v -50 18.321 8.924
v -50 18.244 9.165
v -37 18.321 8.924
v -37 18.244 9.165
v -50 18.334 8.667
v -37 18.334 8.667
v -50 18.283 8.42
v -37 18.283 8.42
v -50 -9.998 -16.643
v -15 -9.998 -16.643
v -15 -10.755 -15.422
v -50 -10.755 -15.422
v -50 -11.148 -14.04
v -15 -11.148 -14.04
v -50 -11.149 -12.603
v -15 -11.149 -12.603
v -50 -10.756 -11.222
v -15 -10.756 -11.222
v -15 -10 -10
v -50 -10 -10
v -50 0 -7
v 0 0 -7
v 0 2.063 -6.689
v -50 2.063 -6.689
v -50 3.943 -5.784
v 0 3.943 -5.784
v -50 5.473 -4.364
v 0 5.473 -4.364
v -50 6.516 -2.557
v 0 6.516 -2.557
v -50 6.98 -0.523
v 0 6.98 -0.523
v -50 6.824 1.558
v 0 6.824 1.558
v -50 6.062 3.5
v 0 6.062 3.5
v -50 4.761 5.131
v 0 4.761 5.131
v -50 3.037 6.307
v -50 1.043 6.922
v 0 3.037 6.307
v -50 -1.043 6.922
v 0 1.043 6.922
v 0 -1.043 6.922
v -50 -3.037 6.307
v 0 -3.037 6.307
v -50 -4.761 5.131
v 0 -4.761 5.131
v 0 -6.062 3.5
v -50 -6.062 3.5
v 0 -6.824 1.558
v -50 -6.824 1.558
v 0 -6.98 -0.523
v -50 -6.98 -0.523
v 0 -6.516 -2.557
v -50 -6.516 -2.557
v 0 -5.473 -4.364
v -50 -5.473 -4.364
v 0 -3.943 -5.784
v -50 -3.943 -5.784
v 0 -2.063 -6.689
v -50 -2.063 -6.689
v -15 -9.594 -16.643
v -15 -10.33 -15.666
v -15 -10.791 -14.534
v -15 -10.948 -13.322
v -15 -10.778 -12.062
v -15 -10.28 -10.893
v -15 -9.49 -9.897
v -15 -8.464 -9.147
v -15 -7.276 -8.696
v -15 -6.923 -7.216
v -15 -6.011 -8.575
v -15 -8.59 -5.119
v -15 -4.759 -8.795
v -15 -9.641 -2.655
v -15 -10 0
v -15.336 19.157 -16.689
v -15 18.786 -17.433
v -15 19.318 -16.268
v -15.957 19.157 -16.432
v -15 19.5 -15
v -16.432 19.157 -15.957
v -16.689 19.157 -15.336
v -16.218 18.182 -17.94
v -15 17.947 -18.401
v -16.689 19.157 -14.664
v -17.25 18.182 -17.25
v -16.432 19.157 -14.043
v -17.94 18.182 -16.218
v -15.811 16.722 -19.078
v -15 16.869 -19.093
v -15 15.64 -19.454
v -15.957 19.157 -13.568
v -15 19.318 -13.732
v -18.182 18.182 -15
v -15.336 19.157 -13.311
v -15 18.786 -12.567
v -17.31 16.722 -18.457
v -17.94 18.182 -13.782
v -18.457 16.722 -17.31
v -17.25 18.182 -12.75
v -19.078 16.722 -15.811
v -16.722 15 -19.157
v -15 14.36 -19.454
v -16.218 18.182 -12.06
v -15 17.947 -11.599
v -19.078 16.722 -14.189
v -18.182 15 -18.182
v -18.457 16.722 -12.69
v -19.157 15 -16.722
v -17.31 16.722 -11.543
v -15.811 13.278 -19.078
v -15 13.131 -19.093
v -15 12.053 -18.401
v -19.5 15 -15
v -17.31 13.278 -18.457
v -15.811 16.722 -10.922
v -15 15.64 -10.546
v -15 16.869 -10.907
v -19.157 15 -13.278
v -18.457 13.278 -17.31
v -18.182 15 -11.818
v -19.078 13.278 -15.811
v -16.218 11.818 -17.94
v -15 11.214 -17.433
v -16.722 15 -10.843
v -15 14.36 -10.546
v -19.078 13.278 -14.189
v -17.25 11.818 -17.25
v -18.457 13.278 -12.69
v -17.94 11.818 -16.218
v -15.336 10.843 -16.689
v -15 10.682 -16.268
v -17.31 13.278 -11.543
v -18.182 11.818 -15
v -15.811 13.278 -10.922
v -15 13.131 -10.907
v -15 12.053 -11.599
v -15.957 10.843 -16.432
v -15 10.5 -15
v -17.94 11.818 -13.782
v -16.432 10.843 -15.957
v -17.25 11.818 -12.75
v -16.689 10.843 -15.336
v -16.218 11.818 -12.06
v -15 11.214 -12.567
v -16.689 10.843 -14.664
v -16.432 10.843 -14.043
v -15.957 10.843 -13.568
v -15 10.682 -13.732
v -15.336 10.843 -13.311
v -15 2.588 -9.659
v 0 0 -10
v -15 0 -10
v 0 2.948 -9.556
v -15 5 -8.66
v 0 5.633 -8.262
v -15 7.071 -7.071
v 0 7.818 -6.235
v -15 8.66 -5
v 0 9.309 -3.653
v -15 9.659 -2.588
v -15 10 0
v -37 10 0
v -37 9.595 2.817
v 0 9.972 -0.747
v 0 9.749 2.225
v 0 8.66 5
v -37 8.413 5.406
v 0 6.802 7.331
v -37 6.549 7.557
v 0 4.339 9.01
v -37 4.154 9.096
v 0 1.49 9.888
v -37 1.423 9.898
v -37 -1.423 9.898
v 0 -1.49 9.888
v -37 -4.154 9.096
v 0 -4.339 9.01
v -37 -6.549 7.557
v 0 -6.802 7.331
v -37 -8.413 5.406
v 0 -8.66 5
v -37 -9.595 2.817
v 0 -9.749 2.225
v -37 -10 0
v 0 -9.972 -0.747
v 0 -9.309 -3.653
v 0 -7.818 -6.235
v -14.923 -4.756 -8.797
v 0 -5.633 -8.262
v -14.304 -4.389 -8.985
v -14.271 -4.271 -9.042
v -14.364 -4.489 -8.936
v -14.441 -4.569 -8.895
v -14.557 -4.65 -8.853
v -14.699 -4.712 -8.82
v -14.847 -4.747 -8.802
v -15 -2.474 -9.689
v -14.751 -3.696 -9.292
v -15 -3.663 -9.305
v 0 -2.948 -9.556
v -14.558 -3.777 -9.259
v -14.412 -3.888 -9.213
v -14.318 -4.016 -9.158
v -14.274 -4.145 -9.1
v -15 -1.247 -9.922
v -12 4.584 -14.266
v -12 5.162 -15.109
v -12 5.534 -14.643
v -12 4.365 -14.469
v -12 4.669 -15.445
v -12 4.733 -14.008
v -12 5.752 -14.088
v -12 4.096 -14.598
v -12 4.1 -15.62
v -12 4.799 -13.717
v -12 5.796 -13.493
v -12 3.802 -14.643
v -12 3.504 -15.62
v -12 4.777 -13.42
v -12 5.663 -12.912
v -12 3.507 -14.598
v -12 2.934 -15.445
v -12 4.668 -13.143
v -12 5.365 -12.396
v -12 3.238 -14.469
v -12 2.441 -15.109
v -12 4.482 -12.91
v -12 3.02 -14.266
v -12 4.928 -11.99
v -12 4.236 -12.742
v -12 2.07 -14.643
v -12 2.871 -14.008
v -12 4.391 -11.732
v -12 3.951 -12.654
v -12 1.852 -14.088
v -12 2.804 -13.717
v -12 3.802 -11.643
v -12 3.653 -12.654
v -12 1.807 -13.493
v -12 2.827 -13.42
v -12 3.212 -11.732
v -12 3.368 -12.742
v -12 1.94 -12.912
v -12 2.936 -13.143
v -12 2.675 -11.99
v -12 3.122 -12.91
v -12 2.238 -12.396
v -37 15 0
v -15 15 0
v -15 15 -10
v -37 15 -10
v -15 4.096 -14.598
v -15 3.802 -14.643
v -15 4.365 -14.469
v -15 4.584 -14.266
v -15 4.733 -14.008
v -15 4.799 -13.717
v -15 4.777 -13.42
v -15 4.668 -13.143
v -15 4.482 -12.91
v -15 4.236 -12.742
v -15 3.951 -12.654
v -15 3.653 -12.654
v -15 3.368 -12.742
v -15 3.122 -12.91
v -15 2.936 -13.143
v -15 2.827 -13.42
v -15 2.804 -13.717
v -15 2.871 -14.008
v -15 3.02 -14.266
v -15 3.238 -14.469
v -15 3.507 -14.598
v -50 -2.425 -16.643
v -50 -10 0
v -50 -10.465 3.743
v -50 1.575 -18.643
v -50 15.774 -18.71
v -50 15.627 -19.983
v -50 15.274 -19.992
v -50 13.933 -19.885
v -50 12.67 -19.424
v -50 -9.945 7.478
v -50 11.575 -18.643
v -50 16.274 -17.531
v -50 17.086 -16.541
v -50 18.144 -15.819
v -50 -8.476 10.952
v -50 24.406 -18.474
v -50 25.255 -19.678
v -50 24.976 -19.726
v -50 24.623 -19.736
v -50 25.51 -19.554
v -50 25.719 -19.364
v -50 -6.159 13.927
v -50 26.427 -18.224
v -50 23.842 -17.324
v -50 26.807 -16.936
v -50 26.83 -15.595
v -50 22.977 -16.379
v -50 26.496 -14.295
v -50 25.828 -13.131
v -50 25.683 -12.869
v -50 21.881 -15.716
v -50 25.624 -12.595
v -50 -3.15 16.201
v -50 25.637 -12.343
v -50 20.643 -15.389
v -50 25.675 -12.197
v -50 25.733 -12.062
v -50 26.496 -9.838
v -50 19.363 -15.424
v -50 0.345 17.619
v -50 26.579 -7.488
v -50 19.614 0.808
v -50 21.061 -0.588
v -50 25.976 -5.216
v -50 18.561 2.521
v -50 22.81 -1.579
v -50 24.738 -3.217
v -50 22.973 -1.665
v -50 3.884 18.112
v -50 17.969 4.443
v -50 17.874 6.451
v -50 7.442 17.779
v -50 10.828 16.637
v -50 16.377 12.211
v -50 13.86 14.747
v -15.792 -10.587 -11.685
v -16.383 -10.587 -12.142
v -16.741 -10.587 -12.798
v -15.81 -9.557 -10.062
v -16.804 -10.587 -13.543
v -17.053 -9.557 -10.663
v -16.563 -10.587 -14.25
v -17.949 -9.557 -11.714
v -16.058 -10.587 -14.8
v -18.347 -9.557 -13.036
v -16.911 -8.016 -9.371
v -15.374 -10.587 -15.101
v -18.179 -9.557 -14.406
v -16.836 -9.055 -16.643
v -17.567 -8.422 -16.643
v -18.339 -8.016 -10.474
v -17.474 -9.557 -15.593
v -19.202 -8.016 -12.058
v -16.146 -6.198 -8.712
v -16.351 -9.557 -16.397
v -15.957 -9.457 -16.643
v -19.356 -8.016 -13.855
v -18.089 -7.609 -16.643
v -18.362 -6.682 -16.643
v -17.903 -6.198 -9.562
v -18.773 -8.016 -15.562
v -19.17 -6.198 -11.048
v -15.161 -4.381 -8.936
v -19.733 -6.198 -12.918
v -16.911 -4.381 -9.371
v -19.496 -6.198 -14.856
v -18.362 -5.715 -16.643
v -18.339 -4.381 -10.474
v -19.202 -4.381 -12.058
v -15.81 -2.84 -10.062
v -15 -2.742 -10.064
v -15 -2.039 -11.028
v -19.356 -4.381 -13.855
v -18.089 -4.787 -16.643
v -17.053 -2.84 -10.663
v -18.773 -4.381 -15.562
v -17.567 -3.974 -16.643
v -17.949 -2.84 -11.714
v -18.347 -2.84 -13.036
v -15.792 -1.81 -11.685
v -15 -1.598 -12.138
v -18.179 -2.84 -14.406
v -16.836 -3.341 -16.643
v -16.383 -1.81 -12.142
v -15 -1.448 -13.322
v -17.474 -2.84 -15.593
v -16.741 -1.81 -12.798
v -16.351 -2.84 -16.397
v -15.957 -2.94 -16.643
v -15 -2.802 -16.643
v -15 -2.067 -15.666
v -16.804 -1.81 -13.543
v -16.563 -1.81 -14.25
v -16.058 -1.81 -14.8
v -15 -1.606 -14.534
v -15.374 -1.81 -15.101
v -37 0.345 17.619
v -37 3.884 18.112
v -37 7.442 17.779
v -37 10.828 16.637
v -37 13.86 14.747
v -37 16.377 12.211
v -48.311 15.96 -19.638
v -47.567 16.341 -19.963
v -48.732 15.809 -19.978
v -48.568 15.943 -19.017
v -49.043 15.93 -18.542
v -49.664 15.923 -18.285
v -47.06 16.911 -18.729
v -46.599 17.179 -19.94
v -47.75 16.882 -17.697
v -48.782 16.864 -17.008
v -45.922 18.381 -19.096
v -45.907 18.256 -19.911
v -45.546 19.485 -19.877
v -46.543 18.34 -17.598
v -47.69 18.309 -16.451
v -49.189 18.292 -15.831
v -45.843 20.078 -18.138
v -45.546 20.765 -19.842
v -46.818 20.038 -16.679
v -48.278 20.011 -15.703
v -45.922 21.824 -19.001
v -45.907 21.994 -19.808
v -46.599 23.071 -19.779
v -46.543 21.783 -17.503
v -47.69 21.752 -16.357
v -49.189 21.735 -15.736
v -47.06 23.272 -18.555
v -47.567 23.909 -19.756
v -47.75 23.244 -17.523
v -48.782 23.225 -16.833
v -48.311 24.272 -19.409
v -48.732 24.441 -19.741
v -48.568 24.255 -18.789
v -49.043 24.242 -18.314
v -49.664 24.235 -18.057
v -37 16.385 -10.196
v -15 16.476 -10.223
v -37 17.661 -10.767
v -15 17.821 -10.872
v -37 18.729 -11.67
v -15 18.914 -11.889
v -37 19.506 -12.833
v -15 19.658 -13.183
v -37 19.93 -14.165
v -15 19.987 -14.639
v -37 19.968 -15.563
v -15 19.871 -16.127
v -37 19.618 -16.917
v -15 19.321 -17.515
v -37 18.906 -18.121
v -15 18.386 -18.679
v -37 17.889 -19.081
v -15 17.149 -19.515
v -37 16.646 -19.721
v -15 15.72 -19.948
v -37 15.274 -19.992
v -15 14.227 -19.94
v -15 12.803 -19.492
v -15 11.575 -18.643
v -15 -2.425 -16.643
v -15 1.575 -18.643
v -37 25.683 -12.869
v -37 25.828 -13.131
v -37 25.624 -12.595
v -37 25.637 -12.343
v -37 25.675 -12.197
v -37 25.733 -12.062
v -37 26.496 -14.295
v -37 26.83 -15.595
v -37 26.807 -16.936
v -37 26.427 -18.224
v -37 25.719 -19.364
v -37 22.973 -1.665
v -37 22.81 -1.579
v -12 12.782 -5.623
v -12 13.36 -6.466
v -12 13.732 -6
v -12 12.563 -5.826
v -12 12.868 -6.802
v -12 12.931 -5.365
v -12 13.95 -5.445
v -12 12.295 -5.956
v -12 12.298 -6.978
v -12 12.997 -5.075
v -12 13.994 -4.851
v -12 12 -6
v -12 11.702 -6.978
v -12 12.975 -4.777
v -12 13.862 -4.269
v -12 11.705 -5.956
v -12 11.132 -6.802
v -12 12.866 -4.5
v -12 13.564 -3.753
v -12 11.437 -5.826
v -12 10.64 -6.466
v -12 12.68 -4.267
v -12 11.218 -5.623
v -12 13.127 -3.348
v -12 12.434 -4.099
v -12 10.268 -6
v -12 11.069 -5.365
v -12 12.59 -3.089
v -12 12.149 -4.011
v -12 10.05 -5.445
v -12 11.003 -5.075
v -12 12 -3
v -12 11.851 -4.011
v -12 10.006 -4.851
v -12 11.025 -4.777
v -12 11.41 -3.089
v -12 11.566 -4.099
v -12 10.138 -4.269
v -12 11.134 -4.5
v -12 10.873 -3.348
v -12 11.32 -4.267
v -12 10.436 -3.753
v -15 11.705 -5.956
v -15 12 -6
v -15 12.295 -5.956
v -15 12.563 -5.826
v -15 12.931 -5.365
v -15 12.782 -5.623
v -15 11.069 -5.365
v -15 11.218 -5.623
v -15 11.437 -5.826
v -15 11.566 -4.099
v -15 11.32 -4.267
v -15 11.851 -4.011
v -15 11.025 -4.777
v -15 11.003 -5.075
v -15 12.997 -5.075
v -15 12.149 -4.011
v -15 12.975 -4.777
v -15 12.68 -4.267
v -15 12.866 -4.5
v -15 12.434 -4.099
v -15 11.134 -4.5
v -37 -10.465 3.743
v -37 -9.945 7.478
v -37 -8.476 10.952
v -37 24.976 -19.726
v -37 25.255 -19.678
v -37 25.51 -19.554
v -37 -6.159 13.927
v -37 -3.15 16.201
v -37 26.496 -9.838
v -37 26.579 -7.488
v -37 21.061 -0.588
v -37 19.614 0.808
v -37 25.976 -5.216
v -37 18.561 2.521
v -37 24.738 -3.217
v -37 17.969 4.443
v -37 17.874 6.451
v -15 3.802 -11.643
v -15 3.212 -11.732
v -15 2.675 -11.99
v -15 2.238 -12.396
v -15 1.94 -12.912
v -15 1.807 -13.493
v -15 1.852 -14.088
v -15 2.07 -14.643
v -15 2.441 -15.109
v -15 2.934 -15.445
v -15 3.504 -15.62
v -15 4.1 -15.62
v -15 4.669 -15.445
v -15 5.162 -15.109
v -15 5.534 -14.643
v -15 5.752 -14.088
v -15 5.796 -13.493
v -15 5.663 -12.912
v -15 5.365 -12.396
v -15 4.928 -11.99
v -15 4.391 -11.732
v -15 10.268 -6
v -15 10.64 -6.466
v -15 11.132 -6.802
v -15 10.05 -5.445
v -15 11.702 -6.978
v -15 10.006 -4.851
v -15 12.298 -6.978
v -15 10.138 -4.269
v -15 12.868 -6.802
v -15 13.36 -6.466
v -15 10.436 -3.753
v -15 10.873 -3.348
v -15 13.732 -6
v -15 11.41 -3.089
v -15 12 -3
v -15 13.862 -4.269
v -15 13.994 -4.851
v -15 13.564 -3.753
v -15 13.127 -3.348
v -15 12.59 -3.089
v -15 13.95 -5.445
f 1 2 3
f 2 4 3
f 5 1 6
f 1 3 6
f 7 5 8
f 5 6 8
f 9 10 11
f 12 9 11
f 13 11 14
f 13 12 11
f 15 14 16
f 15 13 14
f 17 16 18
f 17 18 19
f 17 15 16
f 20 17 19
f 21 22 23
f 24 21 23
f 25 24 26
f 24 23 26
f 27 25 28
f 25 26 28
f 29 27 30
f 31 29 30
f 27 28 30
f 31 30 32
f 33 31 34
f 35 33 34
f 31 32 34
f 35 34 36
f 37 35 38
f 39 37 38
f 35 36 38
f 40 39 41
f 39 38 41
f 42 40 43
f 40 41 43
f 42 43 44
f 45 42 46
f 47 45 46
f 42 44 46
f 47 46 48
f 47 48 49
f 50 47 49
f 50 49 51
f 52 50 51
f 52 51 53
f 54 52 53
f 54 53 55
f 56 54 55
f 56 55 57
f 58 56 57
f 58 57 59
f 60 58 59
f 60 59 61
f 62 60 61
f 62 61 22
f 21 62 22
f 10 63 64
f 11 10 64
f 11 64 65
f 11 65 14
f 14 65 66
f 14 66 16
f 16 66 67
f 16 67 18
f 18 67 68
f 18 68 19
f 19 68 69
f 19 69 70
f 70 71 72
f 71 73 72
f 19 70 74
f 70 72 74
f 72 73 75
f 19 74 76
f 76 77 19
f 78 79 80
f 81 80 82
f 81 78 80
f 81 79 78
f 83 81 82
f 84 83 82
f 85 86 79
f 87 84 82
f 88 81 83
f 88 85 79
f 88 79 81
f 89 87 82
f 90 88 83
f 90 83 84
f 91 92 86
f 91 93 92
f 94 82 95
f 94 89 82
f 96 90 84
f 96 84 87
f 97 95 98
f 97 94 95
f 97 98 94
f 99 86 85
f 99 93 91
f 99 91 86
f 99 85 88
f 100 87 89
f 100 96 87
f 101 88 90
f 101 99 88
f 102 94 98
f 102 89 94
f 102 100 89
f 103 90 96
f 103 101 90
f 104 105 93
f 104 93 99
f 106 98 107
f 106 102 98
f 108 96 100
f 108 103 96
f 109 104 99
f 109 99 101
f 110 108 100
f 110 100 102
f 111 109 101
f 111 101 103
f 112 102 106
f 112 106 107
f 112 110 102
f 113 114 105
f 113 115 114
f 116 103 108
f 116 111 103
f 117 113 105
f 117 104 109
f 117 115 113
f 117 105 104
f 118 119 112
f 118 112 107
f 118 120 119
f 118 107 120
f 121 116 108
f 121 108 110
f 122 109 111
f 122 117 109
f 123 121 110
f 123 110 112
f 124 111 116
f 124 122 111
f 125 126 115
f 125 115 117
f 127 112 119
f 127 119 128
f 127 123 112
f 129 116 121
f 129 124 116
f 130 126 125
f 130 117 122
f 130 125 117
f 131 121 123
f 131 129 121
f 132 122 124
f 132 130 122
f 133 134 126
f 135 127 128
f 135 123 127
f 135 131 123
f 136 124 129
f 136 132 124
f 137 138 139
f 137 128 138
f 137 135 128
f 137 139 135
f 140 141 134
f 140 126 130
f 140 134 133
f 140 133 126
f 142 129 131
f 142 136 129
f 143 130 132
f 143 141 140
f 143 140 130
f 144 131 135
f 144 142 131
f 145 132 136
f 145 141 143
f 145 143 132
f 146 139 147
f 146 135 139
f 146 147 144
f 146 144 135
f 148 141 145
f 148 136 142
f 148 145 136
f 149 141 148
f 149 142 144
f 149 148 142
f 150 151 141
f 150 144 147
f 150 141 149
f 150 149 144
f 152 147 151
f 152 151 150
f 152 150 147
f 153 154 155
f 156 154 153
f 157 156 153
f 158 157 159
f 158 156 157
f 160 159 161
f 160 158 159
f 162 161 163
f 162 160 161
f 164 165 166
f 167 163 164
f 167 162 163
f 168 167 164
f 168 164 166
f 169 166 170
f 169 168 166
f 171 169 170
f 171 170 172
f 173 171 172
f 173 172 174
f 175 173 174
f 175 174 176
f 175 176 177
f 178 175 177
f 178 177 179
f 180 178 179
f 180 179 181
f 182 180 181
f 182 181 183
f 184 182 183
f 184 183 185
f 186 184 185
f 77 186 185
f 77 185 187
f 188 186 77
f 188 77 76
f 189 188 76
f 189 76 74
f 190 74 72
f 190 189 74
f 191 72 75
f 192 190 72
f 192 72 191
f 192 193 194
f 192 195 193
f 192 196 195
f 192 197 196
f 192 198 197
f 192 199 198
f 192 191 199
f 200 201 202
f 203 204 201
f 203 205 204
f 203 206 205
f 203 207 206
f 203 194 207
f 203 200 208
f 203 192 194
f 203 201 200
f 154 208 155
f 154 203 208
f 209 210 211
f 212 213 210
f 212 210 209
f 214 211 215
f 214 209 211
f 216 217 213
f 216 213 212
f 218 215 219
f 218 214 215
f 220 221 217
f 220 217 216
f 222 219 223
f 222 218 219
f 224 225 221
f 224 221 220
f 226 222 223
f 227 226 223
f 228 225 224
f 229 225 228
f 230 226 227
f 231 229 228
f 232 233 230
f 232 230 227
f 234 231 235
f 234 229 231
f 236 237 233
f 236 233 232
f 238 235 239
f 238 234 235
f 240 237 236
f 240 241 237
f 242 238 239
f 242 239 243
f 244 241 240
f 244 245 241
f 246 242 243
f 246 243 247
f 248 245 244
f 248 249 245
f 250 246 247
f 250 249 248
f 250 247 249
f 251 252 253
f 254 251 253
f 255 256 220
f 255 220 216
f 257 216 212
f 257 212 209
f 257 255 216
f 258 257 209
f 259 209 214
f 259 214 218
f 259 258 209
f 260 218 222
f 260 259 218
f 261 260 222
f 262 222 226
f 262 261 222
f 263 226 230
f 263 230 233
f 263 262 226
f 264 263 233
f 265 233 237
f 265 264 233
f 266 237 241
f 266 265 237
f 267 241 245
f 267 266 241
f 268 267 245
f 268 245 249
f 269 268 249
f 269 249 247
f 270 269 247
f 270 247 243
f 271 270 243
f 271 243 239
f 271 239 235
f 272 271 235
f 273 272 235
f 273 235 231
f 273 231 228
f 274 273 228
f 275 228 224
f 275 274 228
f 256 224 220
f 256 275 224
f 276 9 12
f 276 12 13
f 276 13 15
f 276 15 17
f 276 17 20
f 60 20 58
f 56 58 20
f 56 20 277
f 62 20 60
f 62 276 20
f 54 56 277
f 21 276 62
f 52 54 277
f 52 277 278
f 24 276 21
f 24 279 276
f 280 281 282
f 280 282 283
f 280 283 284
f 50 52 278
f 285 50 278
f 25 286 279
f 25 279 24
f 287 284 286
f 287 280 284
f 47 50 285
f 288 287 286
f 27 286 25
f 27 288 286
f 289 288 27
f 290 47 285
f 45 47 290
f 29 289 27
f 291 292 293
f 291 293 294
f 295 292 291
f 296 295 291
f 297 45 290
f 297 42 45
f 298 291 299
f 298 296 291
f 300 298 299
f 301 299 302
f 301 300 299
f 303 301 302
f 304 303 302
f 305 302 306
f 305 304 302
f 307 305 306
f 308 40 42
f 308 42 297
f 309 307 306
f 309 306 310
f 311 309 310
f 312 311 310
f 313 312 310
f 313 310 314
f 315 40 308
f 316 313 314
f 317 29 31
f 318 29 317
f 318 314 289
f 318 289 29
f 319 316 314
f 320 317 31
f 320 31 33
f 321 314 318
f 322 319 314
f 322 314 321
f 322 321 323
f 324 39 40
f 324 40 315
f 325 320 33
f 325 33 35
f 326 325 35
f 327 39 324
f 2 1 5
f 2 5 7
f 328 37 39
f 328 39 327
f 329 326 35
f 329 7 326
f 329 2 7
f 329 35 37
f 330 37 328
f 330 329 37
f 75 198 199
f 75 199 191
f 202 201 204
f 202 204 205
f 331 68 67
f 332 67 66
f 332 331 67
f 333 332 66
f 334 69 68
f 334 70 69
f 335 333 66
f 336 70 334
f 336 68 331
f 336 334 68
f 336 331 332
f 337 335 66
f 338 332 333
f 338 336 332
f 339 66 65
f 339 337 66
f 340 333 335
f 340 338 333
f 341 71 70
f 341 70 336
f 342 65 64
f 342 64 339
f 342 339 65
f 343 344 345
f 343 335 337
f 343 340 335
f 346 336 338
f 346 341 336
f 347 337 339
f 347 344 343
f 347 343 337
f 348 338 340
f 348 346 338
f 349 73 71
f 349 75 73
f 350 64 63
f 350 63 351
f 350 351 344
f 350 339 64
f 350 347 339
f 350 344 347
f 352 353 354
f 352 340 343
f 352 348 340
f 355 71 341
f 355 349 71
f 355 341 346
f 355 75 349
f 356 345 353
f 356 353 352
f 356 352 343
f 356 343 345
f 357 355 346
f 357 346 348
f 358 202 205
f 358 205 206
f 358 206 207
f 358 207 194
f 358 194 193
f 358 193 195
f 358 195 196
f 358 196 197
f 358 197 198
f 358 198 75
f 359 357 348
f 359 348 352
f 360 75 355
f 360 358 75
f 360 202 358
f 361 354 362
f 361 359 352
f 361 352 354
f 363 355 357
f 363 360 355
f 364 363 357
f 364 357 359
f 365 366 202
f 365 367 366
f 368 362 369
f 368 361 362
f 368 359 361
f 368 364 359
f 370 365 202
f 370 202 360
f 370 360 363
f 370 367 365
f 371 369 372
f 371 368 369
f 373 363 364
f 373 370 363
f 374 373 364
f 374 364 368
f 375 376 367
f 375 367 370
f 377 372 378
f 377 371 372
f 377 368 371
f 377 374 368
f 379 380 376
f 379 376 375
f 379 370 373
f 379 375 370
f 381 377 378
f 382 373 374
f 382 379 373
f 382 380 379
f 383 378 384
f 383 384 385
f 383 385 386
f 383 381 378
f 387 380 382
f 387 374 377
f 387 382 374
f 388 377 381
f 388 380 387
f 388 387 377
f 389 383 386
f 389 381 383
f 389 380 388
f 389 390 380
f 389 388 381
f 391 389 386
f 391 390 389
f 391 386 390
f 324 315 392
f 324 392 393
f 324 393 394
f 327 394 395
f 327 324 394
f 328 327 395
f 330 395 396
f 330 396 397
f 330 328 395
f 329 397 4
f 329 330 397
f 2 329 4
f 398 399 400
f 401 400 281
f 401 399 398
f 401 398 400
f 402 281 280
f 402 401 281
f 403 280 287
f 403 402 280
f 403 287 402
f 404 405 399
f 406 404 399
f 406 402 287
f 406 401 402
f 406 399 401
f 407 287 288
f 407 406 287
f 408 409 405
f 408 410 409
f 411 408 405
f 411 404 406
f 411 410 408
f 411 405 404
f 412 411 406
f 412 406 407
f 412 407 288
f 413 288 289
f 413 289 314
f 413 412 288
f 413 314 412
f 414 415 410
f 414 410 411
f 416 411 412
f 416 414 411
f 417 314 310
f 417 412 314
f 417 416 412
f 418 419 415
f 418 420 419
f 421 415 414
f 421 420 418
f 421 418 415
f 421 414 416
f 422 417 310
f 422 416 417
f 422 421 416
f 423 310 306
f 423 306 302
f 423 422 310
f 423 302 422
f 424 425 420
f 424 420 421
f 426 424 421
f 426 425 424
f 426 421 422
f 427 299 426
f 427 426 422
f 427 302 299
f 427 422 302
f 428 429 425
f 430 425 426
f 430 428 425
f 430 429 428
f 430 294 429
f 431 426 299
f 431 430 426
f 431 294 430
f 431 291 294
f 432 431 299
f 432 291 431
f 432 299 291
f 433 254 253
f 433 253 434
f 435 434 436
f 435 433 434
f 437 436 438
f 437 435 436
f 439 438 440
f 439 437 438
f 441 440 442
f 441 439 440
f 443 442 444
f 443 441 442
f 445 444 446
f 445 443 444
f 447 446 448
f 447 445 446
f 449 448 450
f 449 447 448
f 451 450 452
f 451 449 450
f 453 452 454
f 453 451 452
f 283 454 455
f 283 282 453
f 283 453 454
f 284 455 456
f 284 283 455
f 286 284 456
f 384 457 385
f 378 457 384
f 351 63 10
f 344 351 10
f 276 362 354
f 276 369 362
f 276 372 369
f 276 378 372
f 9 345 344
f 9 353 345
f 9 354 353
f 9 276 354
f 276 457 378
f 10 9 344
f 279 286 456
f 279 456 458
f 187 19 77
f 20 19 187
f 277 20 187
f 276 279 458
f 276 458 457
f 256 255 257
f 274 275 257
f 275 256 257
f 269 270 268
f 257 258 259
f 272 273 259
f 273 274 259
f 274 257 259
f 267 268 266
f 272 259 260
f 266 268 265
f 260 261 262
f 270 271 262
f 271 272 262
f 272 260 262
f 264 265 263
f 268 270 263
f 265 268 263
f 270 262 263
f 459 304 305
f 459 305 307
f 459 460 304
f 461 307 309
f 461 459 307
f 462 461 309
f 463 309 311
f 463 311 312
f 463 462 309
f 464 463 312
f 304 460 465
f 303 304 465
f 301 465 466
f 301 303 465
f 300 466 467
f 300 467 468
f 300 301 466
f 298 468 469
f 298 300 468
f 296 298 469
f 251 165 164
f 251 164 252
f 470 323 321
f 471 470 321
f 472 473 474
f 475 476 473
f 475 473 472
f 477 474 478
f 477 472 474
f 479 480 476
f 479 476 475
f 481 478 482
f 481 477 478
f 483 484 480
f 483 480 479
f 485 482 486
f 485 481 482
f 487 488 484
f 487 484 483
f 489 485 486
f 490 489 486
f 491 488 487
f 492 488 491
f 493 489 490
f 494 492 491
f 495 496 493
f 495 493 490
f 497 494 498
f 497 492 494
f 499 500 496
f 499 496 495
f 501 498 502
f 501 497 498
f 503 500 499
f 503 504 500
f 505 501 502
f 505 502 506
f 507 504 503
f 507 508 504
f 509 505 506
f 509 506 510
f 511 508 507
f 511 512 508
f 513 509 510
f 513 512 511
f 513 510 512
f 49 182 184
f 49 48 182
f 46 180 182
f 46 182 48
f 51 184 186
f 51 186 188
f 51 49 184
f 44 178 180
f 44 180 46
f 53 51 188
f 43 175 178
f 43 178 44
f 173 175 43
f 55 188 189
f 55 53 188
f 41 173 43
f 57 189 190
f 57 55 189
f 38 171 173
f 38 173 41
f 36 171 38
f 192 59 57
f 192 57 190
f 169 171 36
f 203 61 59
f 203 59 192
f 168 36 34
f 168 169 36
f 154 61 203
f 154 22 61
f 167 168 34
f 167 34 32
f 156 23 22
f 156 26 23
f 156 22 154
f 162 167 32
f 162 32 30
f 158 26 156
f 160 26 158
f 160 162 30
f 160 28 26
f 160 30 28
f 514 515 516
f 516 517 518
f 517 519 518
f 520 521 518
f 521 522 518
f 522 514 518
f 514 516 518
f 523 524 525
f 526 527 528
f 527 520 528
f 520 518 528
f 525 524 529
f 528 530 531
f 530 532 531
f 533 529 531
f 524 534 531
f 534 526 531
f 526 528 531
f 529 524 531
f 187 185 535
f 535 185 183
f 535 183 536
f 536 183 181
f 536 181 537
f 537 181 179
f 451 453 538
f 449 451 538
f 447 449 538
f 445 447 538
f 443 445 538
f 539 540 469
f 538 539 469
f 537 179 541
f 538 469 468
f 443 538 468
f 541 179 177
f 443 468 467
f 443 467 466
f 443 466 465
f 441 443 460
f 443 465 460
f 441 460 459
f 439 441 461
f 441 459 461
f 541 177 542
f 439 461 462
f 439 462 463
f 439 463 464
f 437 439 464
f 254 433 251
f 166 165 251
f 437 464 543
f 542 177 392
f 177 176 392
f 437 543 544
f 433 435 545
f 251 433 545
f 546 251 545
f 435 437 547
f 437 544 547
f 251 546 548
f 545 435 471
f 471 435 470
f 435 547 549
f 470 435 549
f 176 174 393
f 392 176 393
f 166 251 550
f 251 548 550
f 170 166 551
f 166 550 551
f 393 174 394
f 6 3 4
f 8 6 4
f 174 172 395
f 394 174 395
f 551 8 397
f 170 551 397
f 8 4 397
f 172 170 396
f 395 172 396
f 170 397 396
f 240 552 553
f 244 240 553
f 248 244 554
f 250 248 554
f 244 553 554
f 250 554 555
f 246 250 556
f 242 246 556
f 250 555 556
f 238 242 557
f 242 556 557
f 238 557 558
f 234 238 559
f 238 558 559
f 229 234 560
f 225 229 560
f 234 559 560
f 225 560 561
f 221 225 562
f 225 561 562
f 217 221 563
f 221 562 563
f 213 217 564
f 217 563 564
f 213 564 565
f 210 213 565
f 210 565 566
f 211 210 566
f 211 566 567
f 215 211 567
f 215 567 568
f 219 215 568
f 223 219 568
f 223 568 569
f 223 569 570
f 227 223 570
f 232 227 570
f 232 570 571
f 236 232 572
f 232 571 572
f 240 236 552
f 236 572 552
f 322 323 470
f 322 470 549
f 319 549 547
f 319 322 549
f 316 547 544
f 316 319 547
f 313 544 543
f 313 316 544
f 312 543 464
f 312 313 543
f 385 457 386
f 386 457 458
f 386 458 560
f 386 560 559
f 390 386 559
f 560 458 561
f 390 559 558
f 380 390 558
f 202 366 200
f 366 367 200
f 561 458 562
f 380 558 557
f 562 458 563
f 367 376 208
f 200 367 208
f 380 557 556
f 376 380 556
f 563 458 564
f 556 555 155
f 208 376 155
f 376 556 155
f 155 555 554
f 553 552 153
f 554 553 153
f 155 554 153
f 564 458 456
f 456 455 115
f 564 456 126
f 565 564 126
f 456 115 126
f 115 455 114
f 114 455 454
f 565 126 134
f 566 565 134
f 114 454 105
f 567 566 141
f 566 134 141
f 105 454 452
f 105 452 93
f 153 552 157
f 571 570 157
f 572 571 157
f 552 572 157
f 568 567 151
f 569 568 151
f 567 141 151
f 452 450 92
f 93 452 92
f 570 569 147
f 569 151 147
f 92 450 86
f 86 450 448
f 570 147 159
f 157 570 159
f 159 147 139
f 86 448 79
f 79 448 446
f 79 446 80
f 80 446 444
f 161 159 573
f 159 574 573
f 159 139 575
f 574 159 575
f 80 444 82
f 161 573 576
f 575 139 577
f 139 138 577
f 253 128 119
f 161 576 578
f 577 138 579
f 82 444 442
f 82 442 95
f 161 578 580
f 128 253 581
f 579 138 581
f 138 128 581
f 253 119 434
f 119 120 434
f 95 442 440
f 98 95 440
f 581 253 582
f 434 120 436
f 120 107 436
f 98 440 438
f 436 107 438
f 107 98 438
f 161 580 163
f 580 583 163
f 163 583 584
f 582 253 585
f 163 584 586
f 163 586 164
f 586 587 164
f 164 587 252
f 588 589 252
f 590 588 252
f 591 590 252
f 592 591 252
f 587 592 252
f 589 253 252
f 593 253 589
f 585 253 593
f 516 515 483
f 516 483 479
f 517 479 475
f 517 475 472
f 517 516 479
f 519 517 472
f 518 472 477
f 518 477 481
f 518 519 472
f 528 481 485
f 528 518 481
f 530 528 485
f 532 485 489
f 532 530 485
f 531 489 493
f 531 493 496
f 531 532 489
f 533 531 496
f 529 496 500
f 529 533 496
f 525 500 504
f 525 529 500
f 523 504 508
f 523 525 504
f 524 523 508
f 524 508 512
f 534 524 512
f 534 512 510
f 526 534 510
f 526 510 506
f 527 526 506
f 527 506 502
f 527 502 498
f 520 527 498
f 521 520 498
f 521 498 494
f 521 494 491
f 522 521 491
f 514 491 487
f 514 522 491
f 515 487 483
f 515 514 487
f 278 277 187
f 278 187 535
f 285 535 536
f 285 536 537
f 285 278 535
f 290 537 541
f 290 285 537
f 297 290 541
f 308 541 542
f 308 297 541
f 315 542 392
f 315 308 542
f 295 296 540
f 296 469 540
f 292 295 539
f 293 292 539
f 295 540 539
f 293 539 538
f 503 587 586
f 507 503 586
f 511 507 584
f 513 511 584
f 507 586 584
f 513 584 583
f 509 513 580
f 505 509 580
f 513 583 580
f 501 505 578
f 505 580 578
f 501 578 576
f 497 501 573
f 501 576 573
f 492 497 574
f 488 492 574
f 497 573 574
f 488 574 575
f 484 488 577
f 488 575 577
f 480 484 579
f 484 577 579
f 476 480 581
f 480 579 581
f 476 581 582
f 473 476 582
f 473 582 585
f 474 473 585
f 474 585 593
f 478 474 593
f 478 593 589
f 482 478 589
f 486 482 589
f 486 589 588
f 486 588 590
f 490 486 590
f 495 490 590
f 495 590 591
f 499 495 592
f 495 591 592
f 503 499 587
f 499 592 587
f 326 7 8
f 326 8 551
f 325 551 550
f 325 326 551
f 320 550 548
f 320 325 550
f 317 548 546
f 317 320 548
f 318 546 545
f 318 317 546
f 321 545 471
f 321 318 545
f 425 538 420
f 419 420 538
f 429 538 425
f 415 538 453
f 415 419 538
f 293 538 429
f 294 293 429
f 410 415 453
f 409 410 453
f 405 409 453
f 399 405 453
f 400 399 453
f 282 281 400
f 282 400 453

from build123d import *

# Parameters (mm, degrees)
SKETCH1_R           = 10
BOSS_EXTRUDE1_DEPTH = 50
BOSS_EXTRUDE3_DEPTH = 35
SKETCH8_R           = 2
SKETCH8_R_2         = 1
BOSS_EXTRUDE4_DEPTH = 3
BOSS_EXTRUDE6_DEPTH = 13
FILLET1_R           = 1
FILLET2_R           = 1
SKETCH2_R           = 7
CUT_EXTRUDE2_DEPTH  = 61.180591


with BuildPart() as part:
    # Sketch1 → Boss-Extrude1 (new body)
    with BuildSketch(Plane(origin=(0, 0, 0), x_dir=(0, 0, -1), z_dir=(1, 0, 0))):
        Circle(SKETCH1_R)
    extrude(amount=-BOSS_EXTRUDE1_DEPTH)

    # Sketch3 → Boss-Extrude3 (add)
    with BuildSketch(Plane(origin=(-50, 0, 0), x_dir=(0, 0, -1), z_dir=(1, 0, 0))):
        with BuildLine():
            Line((0, 10), (0, 15))
            Line((0, 15), (10, 15))
            ThreePointArc((10, 15), (16.842071907, 19.648308412), (18.642708436, 11.574992664))
            Line((18.642708436, 11.574992664), (18.642708436, 1.574992664))
            Line((18.642708436, 1.574992664), (16.642708436, -2.425007336))
            Line((16.642708436, -2.425007336), (16.642708436, -9.997750449))
            ThreePointArc((16.642708436, -9.997750449), (13.321760405, -11.198307119), (10, -10))
            Line((10, -10), (0, -10))
            Line((0, -10), (0, 10))
        make_face()
    extrude(amount=BOSS_EXTRUDE3_DEPTH)

    # Sketch6 → Cut-Revolve1 (revolve, cut)
    with BuildSketch(Plane(origin=(-15, 0, 0), x_dir=(0, 0, -1), z_dir=(1, 0, 0))):
        with BuildLine():
            Line((13.321760405, -1.448307119), (13.321760405, -10.948307119))
            ThreePointArc((13.321760405, -10.948307119), (18.071760405, -6.198307119), (13.321760405, -1.448307119))
        make_face()
    revolve(axis=Axis((-15, -1.448307119, -13.321760405), (0, -1, 0)), mode=Mode.SUBTRACT)

    # Sketch7 → Cut-Revolve2 (revolve, cut)
    with BuildSketch(Plane(origin=(-15, 0, 0), x_dir=(0, 0, -1), z_dir=(1, 0, 0))):
        with BuildLine():
            Line((15, 10.5), (15, 19.5))
            ThreePointArc((15, 19.5), (19.5, 15), (15, 10.5))
        make_face()
    revolve(axis=Axis((-15, 10.5, -15), (0, 1, 0)), mode=Mode.SUBTRACT)

    # Sketch8 → Boss-Extrude4 (add)
    # profile 1 of 2: a face of its own
    with BuildSketch(Plane(origin=(-15, 0, 0), x_dir=(0, 0, -1), z_dir=(1, 0, 0))):
        with Locations(Location((13.642708436, 3.801692881, 0), (0, 0, 180))):
            Circle(SKETCH8_R)
        with Locations((13.642708436, 3.801692881)):
            Circle(SKETCH8_R_2, mode=Mode.SUBTRACT)
    # profile 2 of 2: a face of its own
    with BuildSketch(Plane(origin=(-15, 0, 0), x_dir=(0, 0, -1), z_dir=(1, 0, 0))):
        with Locations(Location((5, 12, 0), (0, 0, 180))):
            Circle(SKETCH8_R)
        with Locations((5, 12)):
            Circle(SKETCH8_R_2, mode=Mode.SUBTRACT)
    extrude(amount=BOSS_EXTRUDE4_DEPTH)

    # Sketch10 → Boss-Extrude6 (add)
    with BuildSketch(Plane.ZY.offset(50)):
        with BuildLine():
            Line((-19.714603594, 25.400073987), (-19.992475161, 15.274211174))
            ThreePointArc((-19.992475161, 15.274211174), (-14.862842799, 19.998118436), (-10, 15))
            Line((-10, 15), (0, 15))
            Line((0, 15), (0, 10))
            ThreePointArc((0, 10), (10, 0), (0, -10))
            ThreePointArc((0, -10), (10.951955319, -8.476456548), (17.618849286, 0.345053233))
            ThreePointArc((17.618849286, 0.345053233), (16.545732573, 11.017476726), (8.77988791, 18.416386062))
            ThreePointArc((8.77988791, 18.416386062), (2.657537615, 18.500996178), (-1.611789409, 22.889979975))
            ThreePointArc((-1.611789409, 22.889979975), (-6.607805104, 26.429776463), (-12.643535782, 25.400073987))
            ThreePointArc((-12.643535782, 25.400073987), (-16.179069688, 26.864540081), (-19.714603594, 25.400073987))
        make_face()
    extrude(amount=-BOSS_EXTRUDE6_DEPTH)

    # Fillet1
    fillet1_edges = [part.edges().sort_by_distance(p)[0] for p in [
        (-43.5, 25.400073987, -12.643535782),
        (-43.5, 22.889979975, -1.611789409),
        (-43.5, 18.416386062, 8.77988791),
    ]]
    fillet(fillet1_edges, radius=FILLET1_R)

    # Fillet2
    fillet2_edges = [part.edges().sort_by_distance(p)[0] for p in [
        (-43.5, 25.400073987, -19.714603594),
    ]]
    fillet(fillet2_edges, radius=FILLET2_R)

    # Sketch11 → Cut-Revolve3 (revolve, cut)
    with BuildSketch(Plane(origin=(0, 0.559709606, -20.396267082), x_dir=(-1, 0, 0), z_dir=(0, 0.02743144017102401, -0.999623687239425))):
        with BuildLine():
            Line((50, 24.072659381), (50, 15.072659381))
            ThreePointArc((50, 15.072659381), (45.5, 19.572659381), (50, 24.072659381))
        make_face()
    revolve(axis=Axis((-50, 24.623310138, -19.735919367), (0, -0.9996236872394249, -0.027431440171024075)), mode=Mode.SUBTRACT)

    # Sketch2 → Cut-Extrude2 (cut, through all)
    with BuildSketch(Plane(origin=(0, 0, 0), x_dir=(0, 0, -1), z_dir=(1, 0, 0))):
        Circle(SKETCH2_R)
    extrude(amount=-CUT_EXTRUDE2_DEPTH, mode=Mode.SUBTRACT)


solid = part.part
